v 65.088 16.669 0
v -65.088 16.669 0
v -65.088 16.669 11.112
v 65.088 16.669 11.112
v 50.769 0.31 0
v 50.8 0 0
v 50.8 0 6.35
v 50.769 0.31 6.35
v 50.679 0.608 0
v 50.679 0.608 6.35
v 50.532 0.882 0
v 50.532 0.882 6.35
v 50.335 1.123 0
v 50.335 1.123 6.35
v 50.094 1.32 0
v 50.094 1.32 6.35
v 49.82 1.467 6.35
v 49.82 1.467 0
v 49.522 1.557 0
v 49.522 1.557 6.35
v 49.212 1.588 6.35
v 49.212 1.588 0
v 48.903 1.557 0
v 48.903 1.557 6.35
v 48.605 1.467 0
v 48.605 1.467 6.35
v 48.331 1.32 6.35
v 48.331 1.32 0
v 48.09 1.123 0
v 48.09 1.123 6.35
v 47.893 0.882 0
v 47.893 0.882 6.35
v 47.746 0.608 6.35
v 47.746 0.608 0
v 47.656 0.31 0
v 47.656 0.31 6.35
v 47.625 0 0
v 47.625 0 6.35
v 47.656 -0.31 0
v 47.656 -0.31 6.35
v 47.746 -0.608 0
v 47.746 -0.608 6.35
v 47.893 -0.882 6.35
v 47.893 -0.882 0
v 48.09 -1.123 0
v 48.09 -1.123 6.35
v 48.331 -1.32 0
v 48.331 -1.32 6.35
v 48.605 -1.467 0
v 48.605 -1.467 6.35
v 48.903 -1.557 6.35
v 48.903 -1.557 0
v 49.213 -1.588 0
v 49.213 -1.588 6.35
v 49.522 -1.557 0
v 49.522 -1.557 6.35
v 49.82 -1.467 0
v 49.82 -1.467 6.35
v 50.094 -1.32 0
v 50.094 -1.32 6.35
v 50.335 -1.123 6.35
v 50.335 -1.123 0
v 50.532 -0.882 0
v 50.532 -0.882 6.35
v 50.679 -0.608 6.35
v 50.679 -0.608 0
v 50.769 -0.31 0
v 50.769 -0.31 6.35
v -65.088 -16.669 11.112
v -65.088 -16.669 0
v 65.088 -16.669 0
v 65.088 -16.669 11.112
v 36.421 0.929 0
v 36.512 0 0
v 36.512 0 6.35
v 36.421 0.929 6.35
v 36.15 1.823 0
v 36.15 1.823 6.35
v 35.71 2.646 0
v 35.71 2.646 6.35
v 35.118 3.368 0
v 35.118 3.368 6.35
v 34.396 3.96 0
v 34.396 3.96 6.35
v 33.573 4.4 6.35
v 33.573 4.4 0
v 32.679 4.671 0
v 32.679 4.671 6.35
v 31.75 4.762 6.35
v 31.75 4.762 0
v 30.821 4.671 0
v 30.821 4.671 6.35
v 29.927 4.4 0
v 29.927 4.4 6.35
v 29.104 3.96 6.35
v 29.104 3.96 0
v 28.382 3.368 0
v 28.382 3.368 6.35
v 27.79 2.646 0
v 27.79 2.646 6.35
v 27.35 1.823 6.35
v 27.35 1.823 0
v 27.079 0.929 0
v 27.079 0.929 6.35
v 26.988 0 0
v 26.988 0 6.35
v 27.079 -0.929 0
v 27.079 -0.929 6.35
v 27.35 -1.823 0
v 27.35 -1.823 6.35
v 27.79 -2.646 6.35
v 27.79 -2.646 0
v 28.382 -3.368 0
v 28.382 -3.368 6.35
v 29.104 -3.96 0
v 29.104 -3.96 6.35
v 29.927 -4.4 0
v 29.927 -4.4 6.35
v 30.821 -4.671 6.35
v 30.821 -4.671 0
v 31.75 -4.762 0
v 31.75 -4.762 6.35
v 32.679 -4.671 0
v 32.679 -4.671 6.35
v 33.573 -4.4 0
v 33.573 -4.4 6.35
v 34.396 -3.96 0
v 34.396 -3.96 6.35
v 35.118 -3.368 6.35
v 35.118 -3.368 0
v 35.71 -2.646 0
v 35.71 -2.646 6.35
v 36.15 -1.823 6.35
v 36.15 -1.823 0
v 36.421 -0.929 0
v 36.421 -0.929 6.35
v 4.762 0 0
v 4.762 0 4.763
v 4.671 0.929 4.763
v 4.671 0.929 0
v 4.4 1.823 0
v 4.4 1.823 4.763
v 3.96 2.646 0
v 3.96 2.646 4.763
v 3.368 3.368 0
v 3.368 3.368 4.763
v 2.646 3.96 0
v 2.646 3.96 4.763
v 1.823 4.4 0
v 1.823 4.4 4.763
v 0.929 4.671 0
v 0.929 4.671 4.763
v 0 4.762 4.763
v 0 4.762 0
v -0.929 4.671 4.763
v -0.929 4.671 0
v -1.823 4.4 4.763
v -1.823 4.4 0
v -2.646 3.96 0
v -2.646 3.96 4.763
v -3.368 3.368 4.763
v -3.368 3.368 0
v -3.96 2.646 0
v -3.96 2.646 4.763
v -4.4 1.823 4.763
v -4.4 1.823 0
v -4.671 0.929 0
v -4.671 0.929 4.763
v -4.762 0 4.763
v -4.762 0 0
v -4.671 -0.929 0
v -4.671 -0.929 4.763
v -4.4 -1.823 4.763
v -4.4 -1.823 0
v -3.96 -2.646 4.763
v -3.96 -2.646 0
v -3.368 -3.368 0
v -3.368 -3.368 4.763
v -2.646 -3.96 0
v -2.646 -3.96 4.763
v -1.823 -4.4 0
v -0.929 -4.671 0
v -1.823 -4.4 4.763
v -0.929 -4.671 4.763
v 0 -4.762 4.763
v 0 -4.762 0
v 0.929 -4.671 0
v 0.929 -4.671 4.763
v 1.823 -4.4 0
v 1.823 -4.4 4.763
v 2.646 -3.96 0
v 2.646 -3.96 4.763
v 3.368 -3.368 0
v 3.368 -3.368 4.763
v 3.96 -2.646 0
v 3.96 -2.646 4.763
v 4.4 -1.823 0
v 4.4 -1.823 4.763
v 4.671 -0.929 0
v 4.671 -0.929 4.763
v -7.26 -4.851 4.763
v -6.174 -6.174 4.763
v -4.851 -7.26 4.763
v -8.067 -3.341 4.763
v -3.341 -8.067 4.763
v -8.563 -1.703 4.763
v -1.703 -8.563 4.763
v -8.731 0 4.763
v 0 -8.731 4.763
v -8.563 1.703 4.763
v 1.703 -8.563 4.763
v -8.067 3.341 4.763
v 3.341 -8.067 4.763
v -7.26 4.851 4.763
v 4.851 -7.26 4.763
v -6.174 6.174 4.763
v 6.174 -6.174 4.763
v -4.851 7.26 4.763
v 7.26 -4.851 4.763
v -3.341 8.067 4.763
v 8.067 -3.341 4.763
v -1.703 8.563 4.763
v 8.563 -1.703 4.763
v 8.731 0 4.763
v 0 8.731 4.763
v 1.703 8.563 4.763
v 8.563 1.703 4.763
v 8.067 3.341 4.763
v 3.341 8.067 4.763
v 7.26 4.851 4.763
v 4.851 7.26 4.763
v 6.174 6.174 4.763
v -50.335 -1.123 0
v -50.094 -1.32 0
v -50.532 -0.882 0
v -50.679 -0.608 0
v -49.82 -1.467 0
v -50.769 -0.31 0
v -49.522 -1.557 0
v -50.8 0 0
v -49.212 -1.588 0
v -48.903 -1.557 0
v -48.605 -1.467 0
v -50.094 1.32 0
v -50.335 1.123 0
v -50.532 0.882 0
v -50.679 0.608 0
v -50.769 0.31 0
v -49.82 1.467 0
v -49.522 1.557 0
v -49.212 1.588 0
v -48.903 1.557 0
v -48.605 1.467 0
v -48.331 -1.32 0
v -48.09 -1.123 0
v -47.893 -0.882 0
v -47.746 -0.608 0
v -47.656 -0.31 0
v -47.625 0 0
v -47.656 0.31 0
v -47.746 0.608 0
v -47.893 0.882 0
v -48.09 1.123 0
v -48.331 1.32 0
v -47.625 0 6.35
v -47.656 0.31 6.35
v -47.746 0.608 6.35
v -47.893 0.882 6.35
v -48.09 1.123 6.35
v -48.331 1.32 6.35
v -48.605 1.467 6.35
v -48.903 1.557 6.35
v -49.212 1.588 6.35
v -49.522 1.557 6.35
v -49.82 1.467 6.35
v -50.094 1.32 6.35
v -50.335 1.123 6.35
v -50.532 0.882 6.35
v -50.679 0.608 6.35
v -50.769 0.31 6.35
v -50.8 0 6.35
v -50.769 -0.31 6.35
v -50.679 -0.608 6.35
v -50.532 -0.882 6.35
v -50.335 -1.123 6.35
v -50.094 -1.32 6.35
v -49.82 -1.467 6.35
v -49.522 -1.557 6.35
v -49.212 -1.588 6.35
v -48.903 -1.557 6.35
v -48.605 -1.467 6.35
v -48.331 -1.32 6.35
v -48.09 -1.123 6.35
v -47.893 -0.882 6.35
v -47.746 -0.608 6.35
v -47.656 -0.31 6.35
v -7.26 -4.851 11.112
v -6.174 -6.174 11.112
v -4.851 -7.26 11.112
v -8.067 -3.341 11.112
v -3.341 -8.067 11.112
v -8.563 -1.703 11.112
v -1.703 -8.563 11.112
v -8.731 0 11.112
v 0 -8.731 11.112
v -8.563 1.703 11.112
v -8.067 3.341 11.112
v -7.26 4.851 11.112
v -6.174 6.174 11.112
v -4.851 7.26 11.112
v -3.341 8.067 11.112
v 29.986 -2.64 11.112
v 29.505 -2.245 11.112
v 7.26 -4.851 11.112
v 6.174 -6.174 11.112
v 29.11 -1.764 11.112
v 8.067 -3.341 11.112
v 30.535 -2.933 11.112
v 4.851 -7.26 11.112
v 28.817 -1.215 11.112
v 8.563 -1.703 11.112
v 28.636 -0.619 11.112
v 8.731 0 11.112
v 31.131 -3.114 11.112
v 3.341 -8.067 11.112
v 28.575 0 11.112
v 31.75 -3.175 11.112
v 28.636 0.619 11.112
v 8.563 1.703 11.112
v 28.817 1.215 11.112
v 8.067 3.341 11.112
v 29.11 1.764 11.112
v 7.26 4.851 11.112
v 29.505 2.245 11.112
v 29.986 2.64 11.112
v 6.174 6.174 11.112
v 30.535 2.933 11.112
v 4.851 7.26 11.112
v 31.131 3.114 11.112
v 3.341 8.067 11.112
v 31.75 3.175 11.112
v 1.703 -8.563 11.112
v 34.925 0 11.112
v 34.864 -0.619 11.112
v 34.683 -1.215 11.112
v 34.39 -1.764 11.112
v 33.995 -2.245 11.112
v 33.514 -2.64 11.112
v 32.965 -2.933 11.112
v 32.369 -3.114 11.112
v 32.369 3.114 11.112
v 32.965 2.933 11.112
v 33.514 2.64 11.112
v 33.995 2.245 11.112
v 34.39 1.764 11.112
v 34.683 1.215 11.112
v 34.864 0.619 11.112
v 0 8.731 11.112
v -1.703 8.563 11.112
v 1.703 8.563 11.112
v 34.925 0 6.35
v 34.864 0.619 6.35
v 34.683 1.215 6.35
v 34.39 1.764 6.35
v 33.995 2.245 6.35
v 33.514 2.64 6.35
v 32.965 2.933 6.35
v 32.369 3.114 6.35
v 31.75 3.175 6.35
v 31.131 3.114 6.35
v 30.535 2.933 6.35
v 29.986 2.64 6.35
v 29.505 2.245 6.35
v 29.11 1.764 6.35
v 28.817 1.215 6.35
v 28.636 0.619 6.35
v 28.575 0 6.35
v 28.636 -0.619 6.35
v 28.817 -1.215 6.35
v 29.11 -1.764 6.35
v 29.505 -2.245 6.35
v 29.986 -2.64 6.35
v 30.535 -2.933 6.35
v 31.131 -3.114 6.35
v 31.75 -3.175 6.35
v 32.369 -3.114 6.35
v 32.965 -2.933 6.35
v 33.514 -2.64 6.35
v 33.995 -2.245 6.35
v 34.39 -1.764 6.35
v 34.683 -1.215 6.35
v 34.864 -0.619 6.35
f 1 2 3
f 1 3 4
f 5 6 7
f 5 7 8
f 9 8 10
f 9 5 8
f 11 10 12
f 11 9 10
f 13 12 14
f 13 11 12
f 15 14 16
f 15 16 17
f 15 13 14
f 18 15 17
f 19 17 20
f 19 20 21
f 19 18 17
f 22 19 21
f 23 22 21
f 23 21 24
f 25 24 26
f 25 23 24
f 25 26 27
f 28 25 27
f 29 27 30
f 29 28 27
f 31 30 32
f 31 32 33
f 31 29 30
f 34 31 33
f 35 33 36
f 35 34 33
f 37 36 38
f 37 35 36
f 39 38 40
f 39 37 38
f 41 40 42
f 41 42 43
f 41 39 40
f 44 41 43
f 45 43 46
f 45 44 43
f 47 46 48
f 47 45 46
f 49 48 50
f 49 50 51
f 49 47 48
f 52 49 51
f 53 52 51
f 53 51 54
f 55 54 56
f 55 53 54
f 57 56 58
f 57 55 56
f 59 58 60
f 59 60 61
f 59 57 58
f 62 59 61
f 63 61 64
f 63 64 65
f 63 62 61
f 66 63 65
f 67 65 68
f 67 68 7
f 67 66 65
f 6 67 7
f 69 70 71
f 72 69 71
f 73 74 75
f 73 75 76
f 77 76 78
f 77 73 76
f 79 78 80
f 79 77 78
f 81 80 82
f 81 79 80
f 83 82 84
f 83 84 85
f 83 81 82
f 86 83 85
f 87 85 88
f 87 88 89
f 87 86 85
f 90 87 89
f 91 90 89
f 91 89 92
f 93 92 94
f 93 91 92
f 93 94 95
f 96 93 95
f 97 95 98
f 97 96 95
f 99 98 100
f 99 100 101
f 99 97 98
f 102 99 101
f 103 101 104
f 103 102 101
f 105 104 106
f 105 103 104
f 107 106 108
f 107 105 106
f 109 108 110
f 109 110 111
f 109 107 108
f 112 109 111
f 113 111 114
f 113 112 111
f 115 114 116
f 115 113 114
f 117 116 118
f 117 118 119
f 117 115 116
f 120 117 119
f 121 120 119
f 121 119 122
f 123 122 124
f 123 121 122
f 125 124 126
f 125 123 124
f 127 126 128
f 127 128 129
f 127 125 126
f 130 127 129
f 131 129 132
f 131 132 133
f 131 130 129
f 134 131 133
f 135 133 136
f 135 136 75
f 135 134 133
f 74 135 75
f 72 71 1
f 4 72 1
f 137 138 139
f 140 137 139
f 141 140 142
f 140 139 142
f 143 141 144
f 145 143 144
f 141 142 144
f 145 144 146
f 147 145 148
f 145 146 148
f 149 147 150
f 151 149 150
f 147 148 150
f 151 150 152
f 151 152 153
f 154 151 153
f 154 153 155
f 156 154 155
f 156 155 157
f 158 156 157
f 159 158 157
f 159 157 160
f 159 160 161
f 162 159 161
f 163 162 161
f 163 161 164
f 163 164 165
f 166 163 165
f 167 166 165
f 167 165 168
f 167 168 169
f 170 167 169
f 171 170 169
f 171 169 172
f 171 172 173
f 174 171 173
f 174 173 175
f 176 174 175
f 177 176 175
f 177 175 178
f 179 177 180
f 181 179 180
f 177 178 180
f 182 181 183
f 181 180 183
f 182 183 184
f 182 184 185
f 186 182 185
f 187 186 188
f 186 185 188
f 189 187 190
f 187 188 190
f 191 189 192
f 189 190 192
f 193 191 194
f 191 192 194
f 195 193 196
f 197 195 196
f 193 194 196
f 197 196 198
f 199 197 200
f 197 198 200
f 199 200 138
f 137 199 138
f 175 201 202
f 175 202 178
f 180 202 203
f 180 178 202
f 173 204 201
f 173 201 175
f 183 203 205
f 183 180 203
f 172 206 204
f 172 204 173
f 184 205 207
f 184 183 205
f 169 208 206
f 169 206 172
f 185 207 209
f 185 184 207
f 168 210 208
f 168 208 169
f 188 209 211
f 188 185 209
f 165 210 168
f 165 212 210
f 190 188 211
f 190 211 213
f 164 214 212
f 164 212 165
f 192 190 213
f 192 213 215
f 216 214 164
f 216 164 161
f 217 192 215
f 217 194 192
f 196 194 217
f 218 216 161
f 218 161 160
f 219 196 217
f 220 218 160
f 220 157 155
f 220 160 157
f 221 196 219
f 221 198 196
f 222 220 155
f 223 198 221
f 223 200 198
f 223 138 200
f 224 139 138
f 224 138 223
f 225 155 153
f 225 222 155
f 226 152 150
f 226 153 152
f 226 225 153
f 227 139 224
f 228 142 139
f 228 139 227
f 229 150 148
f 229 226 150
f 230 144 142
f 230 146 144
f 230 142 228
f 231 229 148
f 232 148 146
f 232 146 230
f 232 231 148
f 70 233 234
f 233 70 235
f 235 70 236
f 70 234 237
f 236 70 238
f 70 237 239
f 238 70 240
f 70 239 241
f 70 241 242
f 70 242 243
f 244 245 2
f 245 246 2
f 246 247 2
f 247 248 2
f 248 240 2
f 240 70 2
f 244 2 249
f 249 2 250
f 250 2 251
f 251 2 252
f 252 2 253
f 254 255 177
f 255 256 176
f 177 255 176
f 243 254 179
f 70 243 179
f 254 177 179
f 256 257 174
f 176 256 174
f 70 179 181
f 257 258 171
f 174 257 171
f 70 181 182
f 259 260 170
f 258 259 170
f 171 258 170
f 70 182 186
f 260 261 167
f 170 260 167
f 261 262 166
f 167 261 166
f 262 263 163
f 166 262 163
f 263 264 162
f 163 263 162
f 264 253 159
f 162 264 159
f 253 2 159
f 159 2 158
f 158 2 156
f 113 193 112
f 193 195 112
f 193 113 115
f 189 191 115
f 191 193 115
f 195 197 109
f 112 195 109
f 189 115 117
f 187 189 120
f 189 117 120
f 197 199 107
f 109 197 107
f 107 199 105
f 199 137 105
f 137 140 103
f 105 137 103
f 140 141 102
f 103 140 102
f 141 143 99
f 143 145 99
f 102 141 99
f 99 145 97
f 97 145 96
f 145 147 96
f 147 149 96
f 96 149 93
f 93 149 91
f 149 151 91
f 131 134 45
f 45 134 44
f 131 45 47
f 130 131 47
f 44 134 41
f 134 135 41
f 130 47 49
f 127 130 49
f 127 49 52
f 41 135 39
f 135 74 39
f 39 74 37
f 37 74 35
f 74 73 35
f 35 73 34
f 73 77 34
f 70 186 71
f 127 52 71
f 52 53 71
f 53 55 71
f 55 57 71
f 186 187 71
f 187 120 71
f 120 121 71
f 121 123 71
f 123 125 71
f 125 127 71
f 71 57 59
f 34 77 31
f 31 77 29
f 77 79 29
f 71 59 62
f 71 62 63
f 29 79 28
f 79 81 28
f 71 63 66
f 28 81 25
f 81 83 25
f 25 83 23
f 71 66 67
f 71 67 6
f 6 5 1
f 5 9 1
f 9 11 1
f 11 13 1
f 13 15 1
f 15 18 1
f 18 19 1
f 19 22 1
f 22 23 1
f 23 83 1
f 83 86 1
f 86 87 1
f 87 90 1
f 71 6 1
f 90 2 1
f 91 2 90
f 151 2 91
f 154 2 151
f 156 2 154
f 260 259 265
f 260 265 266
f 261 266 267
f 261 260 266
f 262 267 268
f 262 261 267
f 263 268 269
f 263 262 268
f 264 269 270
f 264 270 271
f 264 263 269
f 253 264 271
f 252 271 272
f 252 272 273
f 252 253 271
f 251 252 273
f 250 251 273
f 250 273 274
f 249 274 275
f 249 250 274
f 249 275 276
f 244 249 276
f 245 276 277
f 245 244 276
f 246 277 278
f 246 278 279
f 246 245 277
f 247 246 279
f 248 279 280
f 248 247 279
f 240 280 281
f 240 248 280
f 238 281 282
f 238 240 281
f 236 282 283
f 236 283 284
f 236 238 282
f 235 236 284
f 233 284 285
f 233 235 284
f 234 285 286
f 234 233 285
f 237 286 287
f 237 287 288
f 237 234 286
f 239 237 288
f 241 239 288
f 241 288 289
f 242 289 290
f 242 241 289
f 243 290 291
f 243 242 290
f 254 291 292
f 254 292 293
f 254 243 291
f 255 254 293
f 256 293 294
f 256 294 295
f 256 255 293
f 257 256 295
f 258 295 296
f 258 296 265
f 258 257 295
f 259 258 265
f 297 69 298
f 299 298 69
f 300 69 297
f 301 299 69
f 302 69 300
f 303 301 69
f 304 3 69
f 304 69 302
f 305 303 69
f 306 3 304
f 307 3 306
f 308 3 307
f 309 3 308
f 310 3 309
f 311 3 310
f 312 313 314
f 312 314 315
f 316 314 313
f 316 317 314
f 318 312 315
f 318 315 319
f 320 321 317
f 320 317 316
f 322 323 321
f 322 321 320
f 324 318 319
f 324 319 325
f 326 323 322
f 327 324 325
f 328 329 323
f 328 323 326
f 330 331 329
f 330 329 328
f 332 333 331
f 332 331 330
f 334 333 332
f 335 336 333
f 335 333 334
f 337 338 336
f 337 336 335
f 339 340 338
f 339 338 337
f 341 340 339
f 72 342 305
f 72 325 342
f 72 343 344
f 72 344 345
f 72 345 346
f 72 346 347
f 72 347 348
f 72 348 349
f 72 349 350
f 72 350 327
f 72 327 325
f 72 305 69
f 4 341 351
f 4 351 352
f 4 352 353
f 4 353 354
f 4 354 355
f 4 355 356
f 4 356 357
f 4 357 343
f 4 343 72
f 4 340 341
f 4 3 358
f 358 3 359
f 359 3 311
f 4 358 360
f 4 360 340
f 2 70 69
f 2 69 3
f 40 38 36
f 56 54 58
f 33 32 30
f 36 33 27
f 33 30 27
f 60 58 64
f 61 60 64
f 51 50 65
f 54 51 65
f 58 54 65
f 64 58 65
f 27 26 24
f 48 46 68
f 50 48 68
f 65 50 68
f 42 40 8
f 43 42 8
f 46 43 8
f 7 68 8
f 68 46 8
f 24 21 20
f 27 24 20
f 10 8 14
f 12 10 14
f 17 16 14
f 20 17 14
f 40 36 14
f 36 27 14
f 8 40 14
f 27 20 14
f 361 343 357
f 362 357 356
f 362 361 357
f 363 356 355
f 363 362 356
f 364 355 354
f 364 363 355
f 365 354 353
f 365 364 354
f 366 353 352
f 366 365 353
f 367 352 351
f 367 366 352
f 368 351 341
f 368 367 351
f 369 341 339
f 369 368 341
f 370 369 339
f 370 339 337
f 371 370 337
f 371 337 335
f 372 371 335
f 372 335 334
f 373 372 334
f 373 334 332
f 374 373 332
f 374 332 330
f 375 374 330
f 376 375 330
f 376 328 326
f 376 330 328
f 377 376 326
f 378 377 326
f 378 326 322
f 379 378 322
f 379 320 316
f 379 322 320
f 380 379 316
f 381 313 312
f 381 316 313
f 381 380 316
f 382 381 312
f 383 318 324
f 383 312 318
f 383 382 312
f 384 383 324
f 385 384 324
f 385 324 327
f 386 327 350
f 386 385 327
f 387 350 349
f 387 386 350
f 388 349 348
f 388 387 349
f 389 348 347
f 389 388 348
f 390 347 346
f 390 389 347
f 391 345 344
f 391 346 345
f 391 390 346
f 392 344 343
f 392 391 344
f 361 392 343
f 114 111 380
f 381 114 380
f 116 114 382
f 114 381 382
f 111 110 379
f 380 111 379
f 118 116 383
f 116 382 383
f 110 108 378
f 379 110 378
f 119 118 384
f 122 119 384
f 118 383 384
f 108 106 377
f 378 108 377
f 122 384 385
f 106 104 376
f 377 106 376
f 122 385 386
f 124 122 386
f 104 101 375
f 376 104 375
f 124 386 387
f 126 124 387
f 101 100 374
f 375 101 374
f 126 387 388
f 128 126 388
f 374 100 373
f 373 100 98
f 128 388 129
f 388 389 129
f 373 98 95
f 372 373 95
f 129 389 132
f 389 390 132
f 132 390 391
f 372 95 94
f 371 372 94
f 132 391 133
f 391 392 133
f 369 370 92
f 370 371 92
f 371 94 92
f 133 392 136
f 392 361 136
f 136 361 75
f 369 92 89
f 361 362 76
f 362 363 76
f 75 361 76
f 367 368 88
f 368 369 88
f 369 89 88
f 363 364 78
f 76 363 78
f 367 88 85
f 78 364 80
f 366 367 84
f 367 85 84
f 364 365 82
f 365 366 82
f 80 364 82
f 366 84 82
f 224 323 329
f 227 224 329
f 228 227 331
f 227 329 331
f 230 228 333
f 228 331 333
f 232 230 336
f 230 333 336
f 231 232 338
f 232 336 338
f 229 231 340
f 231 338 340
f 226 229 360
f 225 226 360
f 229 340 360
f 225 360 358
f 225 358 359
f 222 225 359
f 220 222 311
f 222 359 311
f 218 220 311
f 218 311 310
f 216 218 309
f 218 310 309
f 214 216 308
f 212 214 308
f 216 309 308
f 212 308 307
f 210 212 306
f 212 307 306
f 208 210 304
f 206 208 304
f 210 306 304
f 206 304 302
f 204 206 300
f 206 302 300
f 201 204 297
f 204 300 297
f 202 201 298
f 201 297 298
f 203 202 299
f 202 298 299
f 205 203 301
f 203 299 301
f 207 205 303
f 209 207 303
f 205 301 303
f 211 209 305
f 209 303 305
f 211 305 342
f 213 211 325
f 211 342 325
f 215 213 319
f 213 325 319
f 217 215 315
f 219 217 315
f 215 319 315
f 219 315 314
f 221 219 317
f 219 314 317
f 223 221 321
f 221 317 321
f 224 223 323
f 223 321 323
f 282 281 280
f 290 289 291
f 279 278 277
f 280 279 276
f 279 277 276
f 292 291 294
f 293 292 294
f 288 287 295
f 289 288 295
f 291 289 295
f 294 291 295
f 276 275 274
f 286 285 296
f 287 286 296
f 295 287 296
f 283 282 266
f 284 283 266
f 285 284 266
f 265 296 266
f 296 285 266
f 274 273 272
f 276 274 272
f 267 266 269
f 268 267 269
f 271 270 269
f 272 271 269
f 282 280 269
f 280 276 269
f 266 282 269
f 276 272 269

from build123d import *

# Parameters (mm, degrees)
F0_W      = 130.175
F0_H      = 33.3375
F1_DEPTH  = 11.1125
F2_R      = 8.73125
F2_R_2    = 4.7625
F3_DEPTH  = 6.35
F3_FACE_R = 4.7625
F4_DEPTH  = 11.1135
F5_R      = 1.5875
F6_DEPTH  = 6.35
F5_R_2    = 3.175
F7_DEPTH  = 11.1135
F5_R_3    = 4.7625
F8_DEPTH  = 6.35


with BuildPart() as f1:
    # F0 (on Top) → F1 (new body)
    with BuildSketch(Plane.XY):
        Rectangle(F0_W, F0_H)
    extrude(amount=F1_DEPTH)

    # F2 (on face) → F3 (cut)
    with BuildSketch(Plane.XY.offset(11.1125)):
        Circle(F2_R)
        Circle(F2_R_2, mode=Mode.SUBTRACT)
    extrude(amount=-F3_DEPTH, mode=Mode.SUBTRACT)

    # F3_face (on face) → F4 (cut, through all)
    with BuildSketch(Plane.XY.offset(11.1125)):
        Circle(F3_FACE_R)
    extrude(amount=-F4_DEPTH, mode=Mode.SUBTRACT)

    # F5 (on face) → F6 (cut)
    with BuildSketch(Plane.XY):
        with Locations((-49.2125, 0)):
            Circle(F5_R)
        with Locations((49.2125, 0)):
            Circle(F5_R)
    extrude(amount=F6_DEPTH, mode=Mode.SUBTRACT)

    # F5 (on face) → F7 (cut, through all)
    with BuildSketch(Plane.XY):
        with Locations((31.75, 0)):
            Circle(F5_R_2)
    extrude(amount=F7_DEPTH, mode=Mode.SUBTRACT)

    # F5 (on face) → F8 (cut)
    with BuildSketch(Plane.XY):
        with Locations((31.75, 0)):
            Circle(F5_R_3)
        with Locations((31.75, 0)):
            Circle(F5_R_2, mode=Mode.SUBTRACT)
    extrude(amount=F8_DEPTH, mode=Mode.SUBTRACT)


solid = f1.part
